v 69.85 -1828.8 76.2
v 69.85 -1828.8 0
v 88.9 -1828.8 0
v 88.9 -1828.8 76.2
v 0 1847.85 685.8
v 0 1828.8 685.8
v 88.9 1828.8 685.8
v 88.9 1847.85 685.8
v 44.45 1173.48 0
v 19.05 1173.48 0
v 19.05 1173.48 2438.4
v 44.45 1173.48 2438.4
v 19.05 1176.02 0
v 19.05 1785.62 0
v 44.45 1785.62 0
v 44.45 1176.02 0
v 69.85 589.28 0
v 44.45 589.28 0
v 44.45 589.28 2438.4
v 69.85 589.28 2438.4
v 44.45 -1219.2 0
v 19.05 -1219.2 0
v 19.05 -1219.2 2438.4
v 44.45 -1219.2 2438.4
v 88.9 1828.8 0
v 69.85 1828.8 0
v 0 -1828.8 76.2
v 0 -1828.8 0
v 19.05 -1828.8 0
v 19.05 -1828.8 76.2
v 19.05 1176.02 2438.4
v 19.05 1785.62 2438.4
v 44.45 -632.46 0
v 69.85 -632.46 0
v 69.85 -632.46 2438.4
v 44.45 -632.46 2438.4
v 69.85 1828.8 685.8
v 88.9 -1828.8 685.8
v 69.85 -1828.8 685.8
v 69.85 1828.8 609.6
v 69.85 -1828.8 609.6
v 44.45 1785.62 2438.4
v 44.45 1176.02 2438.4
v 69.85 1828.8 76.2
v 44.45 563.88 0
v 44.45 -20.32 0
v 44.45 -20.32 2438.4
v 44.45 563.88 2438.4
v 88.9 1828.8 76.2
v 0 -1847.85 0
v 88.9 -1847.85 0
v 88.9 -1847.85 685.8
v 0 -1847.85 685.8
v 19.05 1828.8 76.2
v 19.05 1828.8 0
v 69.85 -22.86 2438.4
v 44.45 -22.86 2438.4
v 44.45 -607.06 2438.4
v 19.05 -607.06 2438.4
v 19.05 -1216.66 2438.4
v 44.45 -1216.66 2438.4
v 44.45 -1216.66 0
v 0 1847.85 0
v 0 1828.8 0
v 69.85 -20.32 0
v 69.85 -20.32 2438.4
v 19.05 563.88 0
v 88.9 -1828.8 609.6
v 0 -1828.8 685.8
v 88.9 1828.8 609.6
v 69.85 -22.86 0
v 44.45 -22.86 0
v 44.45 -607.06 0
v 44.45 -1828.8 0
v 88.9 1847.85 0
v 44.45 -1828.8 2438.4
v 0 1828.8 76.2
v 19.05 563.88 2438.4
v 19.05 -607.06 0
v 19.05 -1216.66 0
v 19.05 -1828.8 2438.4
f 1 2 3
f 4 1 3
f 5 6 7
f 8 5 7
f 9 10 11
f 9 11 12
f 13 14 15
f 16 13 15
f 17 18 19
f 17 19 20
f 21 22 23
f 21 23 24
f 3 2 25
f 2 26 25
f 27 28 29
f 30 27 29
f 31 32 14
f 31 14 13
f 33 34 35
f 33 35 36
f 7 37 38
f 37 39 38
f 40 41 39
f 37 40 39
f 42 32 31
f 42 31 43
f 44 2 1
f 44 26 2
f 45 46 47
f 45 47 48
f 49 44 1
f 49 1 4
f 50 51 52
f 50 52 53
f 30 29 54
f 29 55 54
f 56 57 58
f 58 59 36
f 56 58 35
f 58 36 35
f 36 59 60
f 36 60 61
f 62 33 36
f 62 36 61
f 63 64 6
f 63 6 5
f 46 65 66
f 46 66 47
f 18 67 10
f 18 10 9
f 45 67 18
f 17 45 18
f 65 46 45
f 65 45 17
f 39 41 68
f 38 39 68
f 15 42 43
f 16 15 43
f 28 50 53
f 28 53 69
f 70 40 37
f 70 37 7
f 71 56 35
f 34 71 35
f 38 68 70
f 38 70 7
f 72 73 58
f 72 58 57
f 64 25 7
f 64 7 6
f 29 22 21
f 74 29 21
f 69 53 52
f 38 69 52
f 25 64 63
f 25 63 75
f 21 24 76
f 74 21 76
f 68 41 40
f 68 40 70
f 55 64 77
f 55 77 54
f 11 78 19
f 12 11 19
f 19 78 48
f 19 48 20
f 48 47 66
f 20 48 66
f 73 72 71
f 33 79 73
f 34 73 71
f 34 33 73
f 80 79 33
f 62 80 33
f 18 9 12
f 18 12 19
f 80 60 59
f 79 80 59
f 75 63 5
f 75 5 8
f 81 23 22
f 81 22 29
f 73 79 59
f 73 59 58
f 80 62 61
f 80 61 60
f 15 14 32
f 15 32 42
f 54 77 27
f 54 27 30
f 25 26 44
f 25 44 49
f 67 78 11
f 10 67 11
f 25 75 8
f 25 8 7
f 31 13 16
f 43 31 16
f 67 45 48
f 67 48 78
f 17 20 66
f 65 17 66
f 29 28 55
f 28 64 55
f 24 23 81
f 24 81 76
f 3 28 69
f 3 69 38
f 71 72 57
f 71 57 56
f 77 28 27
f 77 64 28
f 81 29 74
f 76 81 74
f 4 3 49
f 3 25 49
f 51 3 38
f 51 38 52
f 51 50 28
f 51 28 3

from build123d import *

# Parameters (mm, degrees)
F0_W     = 19.05
F0_H     = 76.2
F1_DEPTH = 1828.8
F2_W     = 25.4
F2_H     = 609.6
F3_DEPTH = 2438.4
F5_DEPTH = 685.8


with BuildPart() as f1:
    # F0 (on Front) → F1 (new body, symmetric)
    with BuildSketch(Plane.XZ):
        with Locations((9.525, 38.1)):
            Rectangle(F0_W, F0_H)
        with Locations((79.375, 38.1)):
            Rectangle(F0_W, F0_H)
        with Locations((79.375, 647.7)):
            Rectangle(F0_W, F0_H)
    extrude(amount=F1_DEPTH, both=True)


with BuildPart() as f3:
    # F2 (on face) → F3 (new body)
    with BuildSketch(Plane(origin=(0, 0, 0), x_dir=(1, 0, 0), z_dir=(0, 0, -1))):
        with Locations((31.75, 1524)):
            Rectangle(F2_W, F2_H)
        Polygon((44.45, 1216.66), (19.05, 1216.66), (19.05, 607.06), (44.45, 607.06), (44.45, 632.46), align=None)
        Polygon((44.45, 20.32), (44.45, -563.88), (44.45, -589.28), (69.85, -589.28), (69.85, 20.32), align=None)
        Polygon((69.85, 632.46), (44.45, 632.46), (44.45, 607.06), (44.45, 22.86), (69.85, 22.86), align=None)
        Polygon((44.45, -563.88), (19.05, -563.88), (19.05, -1173.48), (44.45, -1173.48), (44.45, -589.28), align=None)
        with Locations((31.75, -1480.82)):
            Rectangle(F2_W, F2_H)
    extrude(amount=-F3_DEPTH)


with BuildPart() as f5:
    # F4 (on face) → F5 (new body, through all)
    with BuildSketch(Plane(origin=(0, 0, 0), x_dir=(1, 0, 0), z_dir=(0, 0, -1))):
        Polygon((19.05, -1828.8), (0, -1828.8), (0, -1847.85), (88.9, -1847.85), (88.9, -1828.8), align=None)
        Polygon((0, 1847.85), (0, 1828.8), (19.05, 1828.8), (88.9, 1828.8), (88.9, 1847.85), align=None)
    extrude(amount=-F5_DEPTH)


solid = Compound([f1.part, f3.part, f5.part])
